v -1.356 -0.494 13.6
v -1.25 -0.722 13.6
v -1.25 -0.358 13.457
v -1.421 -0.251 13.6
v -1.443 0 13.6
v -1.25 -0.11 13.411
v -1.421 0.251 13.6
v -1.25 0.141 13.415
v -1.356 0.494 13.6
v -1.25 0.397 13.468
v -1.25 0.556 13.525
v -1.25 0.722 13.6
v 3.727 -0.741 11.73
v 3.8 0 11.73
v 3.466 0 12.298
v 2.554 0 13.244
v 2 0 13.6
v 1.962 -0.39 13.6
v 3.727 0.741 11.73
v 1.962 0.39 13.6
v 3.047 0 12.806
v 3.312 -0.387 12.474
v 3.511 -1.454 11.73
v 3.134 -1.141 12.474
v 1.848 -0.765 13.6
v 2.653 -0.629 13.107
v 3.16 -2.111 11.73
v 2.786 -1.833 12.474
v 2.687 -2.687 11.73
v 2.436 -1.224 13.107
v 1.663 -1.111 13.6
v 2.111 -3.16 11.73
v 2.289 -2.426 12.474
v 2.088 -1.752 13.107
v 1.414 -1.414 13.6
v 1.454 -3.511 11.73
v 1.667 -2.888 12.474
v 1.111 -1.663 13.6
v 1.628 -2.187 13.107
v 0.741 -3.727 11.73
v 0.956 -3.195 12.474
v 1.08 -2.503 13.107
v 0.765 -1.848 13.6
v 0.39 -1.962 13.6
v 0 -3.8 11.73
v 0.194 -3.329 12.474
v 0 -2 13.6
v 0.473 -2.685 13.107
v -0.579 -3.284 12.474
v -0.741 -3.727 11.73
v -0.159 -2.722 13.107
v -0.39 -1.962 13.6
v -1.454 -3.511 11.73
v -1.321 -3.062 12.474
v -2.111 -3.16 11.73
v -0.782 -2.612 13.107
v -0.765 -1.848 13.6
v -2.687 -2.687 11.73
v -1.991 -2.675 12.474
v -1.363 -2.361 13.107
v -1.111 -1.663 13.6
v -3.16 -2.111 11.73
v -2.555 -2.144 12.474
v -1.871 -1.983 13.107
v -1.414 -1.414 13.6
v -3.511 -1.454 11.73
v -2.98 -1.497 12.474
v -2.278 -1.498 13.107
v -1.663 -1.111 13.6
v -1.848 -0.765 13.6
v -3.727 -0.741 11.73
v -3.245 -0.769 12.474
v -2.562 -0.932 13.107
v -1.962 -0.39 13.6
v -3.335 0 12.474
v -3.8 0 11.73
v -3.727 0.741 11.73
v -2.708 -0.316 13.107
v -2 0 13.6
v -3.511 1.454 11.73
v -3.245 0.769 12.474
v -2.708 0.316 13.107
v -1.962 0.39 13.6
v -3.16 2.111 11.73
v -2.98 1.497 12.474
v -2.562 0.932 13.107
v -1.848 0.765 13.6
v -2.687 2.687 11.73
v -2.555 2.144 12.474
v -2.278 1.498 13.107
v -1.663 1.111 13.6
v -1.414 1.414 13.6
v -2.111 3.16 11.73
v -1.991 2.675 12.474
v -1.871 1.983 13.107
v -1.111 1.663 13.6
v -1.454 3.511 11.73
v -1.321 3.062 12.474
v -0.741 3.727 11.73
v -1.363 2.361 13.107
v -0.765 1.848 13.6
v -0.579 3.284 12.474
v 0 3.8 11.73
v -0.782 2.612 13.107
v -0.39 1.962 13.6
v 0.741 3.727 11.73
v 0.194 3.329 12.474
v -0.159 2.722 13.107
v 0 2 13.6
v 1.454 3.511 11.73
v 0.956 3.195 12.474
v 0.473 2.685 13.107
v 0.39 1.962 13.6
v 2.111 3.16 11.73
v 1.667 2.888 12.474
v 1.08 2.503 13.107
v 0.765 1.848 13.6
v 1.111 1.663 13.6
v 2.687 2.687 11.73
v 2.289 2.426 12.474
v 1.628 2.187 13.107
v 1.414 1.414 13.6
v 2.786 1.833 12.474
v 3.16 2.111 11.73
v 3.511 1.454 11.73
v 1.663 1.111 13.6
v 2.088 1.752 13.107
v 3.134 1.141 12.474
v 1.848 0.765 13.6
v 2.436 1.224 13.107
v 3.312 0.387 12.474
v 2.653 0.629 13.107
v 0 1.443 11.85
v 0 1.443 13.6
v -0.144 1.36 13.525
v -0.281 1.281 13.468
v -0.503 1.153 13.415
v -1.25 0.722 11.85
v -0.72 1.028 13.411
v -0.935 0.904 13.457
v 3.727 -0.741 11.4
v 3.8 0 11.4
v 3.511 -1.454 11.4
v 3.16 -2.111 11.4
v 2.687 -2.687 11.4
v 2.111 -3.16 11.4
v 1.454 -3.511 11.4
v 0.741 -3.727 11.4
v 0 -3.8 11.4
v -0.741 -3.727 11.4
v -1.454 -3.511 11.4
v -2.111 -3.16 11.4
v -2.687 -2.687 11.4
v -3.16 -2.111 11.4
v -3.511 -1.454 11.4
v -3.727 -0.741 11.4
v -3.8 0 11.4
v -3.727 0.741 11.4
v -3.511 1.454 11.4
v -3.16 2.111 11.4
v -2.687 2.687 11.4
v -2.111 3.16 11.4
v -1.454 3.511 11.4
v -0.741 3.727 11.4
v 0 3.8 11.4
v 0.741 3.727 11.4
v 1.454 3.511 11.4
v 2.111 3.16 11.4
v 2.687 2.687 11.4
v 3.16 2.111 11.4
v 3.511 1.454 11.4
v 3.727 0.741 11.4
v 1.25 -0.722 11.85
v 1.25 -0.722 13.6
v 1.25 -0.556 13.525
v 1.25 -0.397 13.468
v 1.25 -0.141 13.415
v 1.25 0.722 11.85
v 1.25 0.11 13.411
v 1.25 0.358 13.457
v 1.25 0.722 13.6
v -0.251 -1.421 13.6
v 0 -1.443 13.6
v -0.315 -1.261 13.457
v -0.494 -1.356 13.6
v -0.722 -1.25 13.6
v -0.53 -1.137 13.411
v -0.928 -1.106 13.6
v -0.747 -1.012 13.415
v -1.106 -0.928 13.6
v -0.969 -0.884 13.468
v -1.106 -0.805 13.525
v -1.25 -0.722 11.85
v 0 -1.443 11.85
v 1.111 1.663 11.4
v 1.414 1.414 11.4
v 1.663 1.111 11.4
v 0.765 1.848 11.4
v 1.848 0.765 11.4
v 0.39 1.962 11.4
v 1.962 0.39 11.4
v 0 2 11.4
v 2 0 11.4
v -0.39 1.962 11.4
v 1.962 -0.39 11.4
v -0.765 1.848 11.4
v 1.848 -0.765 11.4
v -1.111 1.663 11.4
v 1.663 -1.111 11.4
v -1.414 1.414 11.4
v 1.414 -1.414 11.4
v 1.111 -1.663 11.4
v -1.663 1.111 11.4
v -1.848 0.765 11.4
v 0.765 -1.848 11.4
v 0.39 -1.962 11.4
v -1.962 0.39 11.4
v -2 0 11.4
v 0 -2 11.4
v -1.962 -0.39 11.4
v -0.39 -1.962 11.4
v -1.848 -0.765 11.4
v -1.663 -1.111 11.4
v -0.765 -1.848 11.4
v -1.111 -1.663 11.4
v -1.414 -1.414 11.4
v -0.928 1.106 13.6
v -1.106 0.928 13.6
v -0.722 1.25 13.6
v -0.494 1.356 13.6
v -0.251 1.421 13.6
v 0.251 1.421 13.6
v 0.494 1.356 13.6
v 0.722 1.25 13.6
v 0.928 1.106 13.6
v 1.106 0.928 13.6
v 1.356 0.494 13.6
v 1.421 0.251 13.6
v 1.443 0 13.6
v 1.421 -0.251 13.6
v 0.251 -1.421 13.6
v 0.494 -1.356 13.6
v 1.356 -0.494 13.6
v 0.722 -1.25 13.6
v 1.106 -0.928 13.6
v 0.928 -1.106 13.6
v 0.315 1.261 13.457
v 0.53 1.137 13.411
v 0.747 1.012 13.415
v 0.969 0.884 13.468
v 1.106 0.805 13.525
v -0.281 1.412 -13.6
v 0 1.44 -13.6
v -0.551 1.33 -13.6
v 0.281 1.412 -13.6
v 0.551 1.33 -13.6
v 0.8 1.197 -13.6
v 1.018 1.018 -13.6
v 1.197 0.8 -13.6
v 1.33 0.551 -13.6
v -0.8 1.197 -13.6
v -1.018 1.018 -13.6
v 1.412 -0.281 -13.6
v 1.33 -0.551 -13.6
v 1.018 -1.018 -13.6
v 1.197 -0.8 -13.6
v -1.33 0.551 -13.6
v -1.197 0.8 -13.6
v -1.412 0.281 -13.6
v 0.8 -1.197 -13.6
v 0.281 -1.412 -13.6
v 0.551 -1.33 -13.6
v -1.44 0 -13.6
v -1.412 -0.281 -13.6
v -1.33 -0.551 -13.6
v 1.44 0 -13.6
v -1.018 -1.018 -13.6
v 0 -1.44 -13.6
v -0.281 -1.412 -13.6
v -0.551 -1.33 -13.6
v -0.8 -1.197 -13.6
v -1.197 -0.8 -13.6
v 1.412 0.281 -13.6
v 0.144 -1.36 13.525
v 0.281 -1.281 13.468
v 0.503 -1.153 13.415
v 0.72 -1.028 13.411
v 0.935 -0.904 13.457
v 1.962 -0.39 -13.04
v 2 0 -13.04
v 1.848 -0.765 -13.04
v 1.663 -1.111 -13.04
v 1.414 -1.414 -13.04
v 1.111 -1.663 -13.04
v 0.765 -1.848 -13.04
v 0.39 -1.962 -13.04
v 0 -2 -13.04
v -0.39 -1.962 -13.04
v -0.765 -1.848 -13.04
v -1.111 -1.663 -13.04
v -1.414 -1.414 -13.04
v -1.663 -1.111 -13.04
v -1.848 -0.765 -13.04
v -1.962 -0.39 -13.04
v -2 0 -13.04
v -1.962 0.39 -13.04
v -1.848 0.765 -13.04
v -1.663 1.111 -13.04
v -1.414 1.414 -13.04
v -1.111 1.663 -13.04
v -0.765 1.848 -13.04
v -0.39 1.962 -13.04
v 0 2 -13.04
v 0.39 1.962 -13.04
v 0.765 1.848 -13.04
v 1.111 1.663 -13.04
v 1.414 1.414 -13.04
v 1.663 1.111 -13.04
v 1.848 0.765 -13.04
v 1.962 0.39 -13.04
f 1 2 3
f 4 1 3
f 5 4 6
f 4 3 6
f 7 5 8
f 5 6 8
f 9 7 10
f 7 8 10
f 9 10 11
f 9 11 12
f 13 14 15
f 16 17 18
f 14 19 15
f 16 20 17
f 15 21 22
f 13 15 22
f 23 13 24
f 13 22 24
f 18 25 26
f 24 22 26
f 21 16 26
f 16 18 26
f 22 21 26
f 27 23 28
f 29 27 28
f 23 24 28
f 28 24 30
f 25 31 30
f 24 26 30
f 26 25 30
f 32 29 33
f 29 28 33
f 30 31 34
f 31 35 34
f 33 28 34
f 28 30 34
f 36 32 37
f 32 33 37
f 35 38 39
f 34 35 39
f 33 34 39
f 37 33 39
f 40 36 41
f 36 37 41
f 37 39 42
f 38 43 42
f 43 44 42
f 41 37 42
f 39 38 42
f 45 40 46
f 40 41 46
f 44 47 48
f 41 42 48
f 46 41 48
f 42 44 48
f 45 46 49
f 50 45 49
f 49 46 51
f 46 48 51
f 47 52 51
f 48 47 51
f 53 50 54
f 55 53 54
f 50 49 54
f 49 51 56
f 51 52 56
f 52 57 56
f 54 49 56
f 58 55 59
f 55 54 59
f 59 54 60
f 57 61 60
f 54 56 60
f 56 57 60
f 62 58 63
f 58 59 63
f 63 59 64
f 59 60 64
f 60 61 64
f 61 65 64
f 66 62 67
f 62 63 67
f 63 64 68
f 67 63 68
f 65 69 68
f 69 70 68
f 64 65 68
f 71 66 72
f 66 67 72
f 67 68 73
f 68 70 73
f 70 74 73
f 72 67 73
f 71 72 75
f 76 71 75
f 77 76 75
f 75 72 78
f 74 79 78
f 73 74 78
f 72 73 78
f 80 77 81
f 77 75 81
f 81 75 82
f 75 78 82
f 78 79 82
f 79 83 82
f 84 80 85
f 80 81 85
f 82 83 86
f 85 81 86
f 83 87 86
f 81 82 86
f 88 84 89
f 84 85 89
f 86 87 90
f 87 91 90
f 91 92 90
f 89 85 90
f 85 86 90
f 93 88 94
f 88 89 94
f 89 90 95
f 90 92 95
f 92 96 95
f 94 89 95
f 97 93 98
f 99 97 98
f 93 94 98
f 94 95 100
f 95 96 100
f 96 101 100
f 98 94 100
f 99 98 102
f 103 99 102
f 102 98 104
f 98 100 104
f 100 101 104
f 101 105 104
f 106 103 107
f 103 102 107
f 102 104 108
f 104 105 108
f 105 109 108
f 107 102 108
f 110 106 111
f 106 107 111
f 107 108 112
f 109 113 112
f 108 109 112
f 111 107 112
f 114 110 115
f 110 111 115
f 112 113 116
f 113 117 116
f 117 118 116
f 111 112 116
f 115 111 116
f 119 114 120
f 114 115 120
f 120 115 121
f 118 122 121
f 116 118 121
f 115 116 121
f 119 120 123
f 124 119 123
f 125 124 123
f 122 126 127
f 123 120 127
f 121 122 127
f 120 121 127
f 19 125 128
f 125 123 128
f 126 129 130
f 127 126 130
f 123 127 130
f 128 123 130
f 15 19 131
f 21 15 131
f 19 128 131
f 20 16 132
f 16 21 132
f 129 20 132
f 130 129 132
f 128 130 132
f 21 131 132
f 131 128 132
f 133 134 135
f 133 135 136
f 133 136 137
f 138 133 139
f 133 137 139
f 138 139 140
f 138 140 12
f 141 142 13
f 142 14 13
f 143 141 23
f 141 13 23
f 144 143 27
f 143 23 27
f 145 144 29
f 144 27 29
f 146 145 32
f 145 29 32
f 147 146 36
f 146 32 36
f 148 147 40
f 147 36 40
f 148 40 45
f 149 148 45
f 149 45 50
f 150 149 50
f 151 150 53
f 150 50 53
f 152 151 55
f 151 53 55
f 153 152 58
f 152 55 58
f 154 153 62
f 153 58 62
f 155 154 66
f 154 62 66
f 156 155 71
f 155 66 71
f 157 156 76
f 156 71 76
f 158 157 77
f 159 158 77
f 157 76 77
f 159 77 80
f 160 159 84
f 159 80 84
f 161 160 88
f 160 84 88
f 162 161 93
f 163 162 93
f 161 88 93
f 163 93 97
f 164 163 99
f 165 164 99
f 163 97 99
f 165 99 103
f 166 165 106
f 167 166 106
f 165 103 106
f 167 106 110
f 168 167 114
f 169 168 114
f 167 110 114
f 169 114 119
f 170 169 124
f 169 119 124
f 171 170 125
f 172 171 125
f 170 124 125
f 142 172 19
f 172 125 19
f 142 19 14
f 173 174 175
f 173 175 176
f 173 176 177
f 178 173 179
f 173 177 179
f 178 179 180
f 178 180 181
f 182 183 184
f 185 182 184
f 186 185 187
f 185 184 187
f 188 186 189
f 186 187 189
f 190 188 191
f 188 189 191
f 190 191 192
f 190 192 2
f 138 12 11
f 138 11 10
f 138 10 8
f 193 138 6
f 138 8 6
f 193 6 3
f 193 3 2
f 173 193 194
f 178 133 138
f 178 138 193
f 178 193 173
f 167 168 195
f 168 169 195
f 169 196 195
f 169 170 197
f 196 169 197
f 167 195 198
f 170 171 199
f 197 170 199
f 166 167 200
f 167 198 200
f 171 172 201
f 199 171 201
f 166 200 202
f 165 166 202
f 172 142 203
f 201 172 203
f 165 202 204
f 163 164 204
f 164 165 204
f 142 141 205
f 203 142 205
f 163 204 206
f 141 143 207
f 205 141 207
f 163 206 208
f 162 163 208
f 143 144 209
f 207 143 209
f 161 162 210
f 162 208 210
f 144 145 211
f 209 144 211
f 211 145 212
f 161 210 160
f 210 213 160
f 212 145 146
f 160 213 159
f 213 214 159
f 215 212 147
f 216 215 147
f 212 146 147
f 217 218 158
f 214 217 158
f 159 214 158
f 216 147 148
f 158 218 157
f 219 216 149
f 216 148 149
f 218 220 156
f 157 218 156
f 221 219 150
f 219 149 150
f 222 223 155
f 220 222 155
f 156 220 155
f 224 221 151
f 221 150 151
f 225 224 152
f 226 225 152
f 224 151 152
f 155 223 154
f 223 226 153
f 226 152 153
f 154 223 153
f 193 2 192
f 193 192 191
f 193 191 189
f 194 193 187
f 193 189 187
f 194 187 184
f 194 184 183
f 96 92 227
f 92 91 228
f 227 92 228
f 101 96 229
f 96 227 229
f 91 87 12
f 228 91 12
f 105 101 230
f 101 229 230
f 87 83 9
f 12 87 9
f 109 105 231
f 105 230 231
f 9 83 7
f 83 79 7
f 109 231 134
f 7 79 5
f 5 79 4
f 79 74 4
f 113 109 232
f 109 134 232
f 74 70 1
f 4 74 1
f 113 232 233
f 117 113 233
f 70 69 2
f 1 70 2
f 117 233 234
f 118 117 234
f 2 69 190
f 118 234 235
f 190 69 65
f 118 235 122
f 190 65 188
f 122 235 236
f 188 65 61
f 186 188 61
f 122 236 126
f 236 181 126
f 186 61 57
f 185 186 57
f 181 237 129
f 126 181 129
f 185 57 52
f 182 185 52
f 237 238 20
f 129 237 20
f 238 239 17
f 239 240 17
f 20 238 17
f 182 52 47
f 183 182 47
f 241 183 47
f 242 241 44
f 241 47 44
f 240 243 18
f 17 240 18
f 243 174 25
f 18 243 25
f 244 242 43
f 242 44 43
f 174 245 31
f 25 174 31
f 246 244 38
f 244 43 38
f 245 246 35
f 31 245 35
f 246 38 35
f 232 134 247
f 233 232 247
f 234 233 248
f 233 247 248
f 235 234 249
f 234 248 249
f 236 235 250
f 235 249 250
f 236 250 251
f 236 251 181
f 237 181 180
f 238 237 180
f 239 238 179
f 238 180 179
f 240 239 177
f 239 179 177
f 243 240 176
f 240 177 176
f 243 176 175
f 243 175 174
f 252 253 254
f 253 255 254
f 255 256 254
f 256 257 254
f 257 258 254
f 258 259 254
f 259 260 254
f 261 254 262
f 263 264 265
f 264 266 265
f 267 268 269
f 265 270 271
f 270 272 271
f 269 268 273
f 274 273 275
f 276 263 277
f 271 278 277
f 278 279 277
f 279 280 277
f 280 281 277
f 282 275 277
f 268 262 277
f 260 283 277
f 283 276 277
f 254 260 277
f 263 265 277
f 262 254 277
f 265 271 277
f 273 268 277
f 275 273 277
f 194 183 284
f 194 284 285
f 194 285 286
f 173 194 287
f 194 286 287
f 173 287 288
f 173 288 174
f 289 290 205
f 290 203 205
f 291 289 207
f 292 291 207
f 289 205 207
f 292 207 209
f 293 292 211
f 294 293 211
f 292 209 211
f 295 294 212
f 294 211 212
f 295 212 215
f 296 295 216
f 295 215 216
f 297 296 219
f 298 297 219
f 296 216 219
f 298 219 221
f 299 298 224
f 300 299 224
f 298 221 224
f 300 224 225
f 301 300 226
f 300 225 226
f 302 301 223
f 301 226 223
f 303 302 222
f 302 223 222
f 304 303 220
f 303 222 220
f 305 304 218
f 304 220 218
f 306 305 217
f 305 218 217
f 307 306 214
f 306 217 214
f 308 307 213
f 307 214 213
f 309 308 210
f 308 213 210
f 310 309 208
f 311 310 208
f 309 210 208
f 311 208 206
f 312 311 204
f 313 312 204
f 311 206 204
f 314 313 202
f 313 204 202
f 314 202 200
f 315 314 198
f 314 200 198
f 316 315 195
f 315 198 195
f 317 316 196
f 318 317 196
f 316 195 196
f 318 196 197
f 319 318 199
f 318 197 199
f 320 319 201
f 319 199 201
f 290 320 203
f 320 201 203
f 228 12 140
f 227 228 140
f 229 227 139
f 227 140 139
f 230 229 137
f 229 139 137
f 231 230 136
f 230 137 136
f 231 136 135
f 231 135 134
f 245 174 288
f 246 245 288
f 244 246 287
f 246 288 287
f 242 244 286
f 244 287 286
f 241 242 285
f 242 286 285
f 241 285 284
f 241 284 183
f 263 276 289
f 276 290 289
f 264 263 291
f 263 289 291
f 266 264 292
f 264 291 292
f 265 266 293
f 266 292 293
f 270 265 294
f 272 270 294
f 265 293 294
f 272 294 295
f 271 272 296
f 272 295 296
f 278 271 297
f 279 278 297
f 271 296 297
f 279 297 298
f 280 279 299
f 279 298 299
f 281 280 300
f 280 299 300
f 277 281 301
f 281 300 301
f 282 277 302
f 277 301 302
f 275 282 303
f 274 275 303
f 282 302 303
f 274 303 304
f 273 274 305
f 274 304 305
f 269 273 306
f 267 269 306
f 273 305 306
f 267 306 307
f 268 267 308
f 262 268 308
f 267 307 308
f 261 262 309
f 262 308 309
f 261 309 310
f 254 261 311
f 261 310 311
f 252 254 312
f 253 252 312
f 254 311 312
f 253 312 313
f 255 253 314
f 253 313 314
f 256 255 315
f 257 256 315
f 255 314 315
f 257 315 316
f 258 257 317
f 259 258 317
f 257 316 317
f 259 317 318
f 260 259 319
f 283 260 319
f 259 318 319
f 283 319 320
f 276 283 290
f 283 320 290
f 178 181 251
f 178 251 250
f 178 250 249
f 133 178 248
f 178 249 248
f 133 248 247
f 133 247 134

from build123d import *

# Parameters (mm, degrees)
CUT_EXTRUDE1_DEPTH = 1.75


with BuildPart() as part:
    # Sketch2 → Revolve1 (revolve)
    with BuildSketch(Plane(origin=(0, 0, 0), x_dir=(0, 0, -1), z_dir=(1, 0, 0)), mode=Mode.PRIVATE) as revolve1_sk:
        with BuildLine():
            Line((-13.6, 0), (13.6, 0))
            Line((13.6, 0), (13.6, 1.44))
            Line((13.6, 1.44), (13.04, 2))
            Line((13.04, 2), (-11.4, 2))
            Line((-11.4, 2), (-11.4, 3.8))
            Line((-11.4, 3.8), (-11.73, 3.8))
            ThreePointArc((-11.73, 3.8), (-12.806499853, 3.047002626), (-13.6, 2))
            Line((-13.6, 2), (-13.6, 0))
        make_face()
    revolve(revolve1_sk.sketch.rotate(Axis((0, 0, 13.6), (0, 0, -1)), 90), axis=Axis((0, 0, 13.6), (0, 0, -1)))

    # Sketch3 → Cut-Extrude1 (cut)
    with BuildSketch(Plane.XY.offset(13.6)):
        Polygon((0, 1.443375673), (-1.25, 0.721687836), (-1.25, -0.721687836), (0, -1.443375673), (1.25, -0.721687836), (1.25, 0.721687836), align=None)
    extrude(amount=-CUT_EXTRUDE1_DEPTH, mode=Mode.SUBTRACT)

    # Cut-Extrude2 cone 1 section (through the dimple's axis) → Cut-Extrude2 (revolve, cut)
    with BuildSketch(Plane(origin=(0, 0, 13.6), x_dir=(0, -1, 0), z_dir=(1, 0, 0))):
        Polygon((0, 0), (1.443375673, 0), (0, 1.443375673), align=None)
    revolve(axis=Axis((0, 0, 13.6), (0, 0, -1)), mode=Mode.SUBTRACT)


solid = part.part
